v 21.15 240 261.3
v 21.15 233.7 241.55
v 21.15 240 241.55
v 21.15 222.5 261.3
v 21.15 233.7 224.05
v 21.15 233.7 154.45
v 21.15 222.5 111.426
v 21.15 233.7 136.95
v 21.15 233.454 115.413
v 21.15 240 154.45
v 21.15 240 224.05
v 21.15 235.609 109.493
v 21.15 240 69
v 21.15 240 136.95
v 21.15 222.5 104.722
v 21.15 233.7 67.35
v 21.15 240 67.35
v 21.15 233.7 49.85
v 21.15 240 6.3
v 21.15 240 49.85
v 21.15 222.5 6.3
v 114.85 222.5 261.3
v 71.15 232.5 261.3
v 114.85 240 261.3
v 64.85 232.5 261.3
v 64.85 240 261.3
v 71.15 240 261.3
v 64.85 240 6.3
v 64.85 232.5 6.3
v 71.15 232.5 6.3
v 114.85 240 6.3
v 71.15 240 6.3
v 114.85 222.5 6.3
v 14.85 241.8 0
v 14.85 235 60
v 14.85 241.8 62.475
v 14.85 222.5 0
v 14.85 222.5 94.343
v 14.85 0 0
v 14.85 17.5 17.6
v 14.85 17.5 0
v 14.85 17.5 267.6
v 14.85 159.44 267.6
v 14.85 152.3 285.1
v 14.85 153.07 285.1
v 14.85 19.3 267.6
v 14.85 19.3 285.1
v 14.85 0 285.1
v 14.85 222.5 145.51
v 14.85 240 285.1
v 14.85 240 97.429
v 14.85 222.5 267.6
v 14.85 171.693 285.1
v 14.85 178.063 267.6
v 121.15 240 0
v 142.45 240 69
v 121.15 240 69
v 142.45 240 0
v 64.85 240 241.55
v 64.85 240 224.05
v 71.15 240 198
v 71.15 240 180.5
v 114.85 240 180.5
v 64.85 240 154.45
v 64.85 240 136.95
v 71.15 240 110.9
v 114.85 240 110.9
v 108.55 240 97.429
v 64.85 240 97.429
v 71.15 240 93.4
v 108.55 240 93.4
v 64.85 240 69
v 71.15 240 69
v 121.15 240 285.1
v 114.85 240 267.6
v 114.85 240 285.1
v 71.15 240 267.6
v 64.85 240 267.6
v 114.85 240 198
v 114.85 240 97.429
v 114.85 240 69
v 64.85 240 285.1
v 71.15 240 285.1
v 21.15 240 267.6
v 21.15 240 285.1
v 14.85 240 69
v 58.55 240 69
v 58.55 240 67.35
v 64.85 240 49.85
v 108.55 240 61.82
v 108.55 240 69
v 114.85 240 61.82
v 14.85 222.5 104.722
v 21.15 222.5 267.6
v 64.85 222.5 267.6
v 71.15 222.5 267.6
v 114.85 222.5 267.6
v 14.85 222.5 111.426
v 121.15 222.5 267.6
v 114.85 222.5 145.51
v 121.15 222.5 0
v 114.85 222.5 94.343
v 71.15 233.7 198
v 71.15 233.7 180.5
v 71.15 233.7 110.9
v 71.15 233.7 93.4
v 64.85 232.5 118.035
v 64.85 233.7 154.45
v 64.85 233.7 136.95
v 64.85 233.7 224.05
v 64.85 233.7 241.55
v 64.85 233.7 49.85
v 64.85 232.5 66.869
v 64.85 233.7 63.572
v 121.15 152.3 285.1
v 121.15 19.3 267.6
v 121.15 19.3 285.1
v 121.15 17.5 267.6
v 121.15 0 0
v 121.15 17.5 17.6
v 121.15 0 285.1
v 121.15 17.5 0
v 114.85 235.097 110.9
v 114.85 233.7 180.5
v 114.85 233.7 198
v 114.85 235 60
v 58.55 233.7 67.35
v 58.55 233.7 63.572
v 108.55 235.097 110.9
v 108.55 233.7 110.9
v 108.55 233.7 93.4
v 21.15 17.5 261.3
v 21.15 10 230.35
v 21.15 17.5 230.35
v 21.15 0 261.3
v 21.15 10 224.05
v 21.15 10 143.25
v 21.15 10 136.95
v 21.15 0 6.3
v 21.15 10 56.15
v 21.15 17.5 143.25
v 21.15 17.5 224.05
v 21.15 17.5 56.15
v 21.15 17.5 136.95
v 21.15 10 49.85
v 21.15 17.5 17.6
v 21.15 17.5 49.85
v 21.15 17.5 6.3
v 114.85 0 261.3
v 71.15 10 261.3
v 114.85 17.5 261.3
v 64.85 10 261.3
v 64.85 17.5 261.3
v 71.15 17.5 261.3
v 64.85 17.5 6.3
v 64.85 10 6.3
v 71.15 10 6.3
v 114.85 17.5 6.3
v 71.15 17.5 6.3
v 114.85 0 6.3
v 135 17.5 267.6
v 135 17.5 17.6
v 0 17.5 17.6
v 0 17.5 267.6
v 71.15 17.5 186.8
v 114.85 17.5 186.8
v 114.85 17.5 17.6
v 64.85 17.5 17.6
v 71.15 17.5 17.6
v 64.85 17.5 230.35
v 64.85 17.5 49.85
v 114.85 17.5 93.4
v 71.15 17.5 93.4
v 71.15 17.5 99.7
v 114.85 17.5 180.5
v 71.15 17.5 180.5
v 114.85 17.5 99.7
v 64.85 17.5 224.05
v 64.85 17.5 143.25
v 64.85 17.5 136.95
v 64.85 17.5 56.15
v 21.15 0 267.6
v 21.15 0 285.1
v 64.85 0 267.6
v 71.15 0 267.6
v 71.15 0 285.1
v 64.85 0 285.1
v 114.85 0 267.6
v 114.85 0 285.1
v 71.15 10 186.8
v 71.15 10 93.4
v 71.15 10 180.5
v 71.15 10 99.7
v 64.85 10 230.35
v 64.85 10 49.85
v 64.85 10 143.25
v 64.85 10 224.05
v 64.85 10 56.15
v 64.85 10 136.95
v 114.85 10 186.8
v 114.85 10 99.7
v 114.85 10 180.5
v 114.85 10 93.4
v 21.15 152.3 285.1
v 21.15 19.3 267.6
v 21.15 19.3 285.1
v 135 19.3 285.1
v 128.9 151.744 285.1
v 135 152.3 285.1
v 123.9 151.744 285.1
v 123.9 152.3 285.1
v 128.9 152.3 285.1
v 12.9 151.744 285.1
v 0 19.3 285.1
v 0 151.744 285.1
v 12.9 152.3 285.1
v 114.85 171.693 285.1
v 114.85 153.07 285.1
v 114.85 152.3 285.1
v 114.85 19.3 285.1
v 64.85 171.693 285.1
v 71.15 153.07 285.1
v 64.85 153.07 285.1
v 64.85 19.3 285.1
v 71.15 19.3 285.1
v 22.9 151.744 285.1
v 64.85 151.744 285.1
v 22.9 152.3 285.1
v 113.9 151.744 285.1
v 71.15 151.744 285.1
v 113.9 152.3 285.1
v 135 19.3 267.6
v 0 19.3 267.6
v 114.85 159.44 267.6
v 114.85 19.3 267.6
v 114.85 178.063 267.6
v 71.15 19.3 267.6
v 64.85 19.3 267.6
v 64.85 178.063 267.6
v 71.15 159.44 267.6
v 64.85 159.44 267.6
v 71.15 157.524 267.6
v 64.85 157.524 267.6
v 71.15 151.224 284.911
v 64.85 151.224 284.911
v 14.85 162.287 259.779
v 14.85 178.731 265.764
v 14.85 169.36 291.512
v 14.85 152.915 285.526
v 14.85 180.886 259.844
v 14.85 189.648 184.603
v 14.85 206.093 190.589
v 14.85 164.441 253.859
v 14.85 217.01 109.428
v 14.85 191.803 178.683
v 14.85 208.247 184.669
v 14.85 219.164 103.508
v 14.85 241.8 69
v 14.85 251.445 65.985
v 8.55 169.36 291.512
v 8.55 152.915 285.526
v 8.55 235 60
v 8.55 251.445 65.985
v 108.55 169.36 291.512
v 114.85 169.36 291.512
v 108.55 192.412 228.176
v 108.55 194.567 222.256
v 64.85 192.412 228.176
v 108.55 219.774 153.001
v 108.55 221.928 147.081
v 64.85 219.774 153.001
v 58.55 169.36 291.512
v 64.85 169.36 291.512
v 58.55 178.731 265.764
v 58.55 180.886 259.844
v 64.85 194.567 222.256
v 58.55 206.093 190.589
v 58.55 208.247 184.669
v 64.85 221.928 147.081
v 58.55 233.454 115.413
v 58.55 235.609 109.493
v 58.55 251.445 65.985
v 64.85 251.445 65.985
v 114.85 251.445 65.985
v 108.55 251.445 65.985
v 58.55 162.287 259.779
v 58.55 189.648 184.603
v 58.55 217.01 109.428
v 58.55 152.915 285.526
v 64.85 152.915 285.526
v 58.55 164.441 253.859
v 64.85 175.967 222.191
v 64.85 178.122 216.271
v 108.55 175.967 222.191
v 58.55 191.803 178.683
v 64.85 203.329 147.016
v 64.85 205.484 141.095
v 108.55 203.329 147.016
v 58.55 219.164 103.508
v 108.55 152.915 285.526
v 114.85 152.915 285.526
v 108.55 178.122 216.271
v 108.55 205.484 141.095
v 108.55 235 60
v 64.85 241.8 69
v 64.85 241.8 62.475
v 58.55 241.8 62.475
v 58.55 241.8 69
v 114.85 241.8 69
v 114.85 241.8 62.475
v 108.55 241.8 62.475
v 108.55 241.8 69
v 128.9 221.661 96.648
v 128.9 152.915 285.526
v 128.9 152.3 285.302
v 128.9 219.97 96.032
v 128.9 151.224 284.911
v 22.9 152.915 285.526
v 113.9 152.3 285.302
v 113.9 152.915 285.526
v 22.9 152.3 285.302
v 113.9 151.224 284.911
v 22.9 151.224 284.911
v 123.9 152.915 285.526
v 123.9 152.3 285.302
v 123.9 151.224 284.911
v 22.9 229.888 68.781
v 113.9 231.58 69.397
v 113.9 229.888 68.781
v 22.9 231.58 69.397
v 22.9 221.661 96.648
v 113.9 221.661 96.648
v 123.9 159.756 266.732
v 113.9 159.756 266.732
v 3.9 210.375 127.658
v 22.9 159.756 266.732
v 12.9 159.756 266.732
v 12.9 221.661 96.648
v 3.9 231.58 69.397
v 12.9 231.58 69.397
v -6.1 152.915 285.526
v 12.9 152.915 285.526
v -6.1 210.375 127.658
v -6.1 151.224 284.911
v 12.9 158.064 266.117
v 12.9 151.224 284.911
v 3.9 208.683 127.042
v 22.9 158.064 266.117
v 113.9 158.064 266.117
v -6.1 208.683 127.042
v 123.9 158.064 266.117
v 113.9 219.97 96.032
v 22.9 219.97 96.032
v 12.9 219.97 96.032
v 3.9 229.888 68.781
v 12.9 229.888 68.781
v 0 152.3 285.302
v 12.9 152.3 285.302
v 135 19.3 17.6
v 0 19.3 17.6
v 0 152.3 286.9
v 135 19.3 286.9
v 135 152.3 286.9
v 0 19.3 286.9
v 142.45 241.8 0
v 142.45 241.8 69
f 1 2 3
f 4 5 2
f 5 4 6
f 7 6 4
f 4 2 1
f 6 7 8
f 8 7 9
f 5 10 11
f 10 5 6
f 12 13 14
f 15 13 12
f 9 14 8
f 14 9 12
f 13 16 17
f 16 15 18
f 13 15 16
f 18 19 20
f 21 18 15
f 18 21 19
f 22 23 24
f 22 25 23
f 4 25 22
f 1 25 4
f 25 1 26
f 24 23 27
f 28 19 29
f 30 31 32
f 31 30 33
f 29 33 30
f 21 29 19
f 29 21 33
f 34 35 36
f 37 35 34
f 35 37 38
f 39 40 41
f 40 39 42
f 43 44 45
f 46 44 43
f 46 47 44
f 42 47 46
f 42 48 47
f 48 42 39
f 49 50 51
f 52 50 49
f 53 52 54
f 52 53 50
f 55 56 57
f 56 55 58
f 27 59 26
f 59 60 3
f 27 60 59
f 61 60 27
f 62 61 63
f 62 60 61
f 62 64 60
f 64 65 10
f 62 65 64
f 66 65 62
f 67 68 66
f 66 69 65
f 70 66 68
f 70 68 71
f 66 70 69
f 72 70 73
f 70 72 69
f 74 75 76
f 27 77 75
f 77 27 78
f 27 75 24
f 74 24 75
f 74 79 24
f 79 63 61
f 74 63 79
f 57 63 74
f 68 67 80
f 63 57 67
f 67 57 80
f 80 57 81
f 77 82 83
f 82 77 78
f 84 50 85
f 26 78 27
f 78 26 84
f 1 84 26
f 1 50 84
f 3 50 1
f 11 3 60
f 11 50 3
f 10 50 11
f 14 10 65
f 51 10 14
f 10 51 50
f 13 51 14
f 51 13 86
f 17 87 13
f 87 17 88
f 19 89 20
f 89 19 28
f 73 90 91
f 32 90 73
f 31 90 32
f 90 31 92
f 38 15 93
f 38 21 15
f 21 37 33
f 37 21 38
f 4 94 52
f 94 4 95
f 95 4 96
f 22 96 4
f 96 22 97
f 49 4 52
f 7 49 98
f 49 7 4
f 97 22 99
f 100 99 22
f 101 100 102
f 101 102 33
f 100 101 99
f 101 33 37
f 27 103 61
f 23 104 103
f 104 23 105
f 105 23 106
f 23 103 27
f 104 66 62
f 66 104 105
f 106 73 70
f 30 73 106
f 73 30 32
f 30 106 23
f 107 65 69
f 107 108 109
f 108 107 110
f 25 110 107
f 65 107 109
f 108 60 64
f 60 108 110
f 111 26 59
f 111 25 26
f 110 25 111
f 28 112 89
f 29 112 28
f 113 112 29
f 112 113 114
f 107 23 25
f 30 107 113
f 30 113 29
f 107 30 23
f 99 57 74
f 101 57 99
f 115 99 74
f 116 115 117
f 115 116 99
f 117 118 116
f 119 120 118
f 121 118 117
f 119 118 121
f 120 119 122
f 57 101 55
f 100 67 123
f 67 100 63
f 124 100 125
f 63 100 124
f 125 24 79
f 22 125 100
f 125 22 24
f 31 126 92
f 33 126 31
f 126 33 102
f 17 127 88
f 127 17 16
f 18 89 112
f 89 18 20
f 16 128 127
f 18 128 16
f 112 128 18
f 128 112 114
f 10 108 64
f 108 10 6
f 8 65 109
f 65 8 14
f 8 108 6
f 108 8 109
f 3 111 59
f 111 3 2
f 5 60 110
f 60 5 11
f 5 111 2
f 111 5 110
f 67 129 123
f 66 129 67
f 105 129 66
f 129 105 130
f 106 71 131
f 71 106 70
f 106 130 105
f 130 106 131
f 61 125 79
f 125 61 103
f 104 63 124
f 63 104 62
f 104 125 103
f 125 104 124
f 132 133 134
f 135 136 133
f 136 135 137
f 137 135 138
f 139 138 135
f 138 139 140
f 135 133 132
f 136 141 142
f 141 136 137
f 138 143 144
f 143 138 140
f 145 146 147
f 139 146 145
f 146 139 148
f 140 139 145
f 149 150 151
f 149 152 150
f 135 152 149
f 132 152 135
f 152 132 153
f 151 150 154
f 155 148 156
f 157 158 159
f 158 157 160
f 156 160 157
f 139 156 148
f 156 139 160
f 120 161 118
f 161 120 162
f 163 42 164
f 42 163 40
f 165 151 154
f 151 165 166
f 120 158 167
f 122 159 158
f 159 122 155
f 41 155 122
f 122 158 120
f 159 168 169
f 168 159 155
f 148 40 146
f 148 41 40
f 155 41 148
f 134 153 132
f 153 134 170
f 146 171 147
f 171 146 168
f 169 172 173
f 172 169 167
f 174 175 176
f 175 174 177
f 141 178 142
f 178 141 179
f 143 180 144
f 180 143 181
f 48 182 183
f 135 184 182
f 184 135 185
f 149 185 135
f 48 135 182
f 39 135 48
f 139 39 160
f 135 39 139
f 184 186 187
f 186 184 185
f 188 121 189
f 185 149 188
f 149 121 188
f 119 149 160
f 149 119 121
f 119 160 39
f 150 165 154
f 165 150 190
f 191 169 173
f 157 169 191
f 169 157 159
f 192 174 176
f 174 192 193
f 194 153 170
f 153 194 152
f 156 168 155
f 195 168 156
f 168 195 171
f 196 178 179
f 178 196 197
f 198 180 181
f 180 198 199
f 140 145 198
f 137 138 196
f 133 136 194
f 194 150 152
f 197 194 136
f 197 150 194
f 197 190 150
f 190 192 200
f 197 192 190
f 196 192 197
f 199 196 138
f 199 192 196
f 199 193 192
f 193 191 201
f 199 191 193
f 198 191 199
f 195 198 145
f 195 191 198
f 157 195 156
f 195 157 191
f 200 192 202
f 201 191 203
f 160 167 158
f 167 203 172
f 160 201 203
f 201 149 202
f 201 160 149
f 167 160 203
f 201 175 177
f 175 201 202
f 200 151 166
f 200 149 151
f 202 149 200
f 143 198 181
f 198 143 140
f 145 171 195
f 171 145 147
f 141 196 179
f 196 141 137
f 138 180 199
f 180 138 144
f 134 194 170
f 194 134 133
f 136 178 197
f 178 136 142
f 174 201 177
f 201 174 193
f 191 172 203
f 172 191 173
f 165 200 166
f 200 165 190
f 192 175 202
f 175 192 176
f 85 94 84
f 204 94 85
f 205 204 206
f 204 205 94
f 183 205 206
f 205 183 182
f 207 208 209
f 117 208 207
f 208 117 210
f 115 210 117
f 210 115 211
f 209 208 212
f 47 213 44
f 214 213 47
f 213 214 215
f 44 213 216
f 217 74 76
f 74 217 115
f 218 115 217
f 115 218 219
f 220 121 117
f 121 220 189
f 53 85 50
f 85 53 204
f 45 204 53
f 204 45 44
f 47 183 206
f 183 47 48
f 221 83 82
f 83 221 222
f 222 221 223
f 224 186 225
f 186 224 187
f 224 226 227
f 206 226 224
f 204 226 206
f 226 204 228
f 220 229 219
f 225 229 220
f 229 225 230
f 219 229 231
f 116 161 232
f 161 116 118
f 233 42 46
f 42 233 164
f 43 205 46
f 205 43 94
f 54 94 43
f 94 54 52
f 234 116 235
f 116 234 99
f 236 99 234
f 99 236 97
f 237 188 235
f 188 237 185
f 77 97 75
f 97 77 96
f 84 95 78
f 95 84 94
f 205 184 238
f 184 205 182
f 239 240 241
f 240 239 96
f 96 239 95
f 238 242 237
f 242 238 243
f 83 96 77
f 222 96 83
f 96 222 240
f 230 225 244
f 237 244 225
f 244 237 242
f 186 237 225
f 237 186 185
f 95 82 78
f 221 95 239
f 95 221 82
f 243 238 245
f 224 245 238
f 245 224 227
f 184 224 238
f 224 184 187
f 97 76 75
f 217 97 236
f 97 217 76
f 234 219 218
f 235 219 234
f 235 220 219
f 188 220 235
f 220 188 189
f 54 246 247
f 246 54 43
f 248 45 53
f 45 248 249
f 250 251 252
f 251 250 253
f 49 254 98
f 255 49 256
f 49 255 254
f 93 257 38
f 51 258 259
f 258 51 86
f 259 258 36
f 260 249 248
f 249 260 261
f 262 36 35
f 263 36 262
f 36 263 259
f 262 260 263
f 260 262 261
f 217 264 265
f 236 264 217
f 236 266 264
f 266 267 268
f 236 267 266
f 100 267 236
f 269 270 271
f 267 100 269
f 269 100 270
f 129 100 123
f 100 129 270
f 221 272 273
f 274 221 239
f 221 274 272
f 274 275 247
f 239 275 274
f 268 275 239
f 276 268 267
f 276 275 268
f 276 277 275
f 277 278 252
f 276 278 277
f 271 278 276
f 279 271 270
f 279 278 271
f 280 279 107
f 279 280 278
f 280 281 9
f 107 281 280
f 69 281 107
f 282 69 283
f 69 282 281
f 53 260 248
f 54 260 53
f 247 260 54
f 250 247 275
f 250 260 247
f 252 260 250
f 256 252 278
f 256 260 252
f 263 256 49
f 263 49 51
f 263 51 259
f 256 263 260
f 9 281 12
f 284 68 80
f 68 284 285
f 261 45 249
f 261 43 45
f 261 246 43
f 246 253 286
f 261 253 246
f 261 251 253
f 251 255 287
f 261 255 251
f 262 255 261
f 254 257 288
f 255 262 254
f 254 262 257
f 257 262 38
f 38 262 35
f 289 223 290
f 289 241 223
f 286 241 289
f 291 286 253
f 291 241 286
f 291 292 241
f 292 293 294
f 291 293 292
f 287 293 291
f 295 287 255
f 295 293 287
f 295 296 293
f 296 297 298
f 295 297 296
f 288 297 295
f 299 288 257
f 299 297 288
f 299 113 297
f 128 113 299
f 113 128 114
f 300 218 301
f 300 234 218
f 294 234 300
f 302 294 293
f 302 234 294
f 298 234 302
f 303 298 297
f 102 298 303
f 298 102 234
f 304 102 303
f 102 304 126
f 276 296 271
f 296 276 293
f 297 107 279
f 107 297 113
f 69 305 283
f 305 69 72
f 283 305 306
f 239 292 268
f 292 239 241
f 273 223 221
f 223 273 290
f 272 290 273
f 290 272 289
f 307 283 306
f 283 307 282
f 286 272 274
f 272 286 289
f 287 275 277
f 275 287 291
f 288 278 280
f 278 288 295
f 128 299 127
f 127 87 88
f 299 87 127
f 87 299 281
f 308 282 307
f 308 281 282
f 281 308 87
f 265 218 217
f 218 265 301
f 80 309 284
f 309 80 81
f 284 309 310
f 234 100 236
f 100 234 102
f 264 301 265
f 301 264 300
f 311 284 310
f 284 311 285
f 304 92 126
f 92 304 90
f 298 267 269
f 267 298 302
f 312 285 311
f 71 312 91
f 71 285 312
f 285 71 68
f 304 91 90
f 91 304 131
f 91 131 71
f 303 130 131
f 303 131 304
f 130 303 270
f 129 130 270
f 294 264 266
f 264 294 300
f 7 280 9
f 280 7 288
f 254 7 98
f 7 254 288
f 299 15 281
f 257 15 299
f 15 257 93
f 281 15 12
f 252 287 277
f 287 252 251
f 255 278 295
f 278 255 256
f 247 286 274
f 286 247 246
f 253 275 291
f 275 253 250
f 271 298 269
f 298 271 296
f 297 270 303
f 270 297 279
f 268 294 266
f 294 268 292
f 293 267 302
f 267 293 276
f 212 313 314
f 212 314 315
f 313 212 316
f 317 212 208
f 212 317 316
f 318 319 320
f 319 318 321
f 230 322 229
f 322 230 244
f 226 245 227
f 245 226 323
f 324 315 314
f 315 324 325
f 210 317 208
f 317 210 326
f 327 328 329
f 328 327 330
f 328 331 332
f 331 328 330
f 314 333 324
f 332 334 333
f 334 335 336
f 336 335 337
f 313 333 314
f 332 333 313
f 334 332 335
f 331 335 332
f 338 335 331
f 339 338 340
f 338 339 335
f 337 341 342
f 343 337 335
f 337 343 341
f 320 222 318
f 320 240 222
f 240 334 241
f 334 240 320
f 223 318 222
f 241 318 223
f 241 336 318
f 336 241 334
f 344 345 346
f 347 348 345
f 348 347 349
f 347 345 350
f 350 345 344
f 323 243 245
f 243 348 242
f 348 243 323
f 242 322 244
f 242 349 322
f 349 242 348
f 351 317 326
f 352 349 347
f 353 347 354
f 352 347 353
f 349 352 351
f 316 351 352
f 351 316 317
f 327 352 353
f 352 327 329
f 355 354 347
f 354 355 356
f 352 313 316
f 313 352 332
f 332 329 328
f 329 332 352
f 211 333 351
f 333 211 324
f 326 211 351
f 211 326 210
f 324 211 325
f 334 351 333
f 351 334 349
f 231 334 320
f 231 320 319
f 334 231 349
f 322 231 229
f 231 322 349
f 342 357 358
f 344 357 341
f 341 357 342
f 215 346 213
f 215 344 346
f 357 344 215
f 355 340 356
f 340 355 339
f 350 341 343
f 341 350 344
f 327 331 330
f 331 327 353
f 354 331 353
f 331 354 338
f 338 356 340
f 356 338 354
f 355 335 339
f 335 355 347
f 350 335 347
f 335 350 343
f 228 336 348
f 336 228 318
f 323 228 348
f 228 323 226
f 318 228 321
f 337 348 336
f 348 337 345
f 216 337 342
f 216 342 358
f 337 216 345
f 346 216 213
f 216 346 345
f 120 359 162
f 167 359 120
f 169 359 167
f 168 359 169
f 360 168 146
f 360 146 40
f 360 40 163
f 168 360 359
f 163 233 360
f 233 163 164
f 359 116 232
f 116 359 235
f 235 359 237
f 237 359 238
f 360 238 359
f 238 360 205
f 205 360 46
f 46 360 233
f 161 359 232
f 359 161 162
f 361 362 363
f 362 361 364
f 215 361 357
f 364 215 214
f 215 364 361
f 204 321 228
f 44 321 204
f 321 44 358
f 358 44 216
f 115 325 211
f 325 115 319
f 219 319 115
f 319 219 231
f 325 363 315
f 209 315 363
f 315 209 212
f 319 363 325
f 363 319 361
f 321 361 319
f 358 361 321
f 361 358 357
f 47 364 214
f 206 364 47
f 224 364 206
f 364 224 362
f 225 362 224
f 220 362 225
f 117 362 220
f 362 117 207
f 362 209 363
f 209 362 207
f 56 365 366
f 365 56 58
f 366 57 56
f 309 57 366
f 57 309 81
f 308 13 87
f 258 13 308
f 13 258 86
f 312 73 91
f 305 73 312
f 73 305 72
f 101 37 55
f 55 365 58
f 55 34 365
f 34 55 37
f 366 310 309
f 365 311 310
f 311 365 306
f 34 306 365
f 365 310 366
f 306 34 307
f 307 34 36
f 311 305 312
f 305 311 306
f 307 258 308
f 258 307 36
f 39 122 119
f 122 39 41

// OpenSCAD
// file: GuestRoomForClimbing.scad
/*
  File:
  GuestRoomForClimbing.scad

  Description:
  The guest room in 45 rue VIlleroy place for climbing

  Auteur : Paul-Elliot Anglèes d'Auriac

  Licence : CC-BY-SA 3.0
*/

module guestRoomForClimbing() {
union() {
    translate([0,260,0]) cube([136,4,300]);

    translate([-4,260-49,0]) cube([4,49,300]);

    translate([136,260-59,0]) cube([4,59,300]);

    translate([136,260-59,0]) cube([23,4,300]);

    difference() {
        translate([136+23,260-59-126,0]) cube([4,126,300]);
        translate([136+23-1, 75+14, 100]) cube([6,(126-3*14)/2,160]);
        translate([136+23-1, 75+14+(126-3*14)/2+14, 100]) cube([6,(126-3*14)/2,160]);
    }

    translate([136,260-59-126-4,0]) cube([23,4,300]);

    translate([136,260-59-126-75,0]) cube([4,75,300]);

    translate([0,-4,0]) cube([136,4,300]);
    
    translate([0,260-20,180]) cube([136,20,120]);

    translate([-60,35,0]) cube([195,120,50]);
*    translate([10,25,0]) cube([120,195,50]);
}

}
// main file
/*
  File:
  ClimbingStructure.scad

  Description:
  The structure for climbing

  Auteur : Paul-Elliot Anglèes d'Auriac

  Licence : CC-BY-SA 3.0
*/


$largeur = 6.3;
$longueur = 17.5;
$largeur_fine = 6.3;
$longueur_fine = 7.5;
$rallonge = 15;

$epaisseur_panneau = 1.8;
$longueur_panneau = 115+$largeur*2;
$largeur_panneau = 100;

$largeur_barre_basse = 100;

$nb_tasseaux = 2;


$show_panneau = true;

use <GuestRoomForClimbing.scad>

% guestRoomForClimbing();


/**************************************************/
// la structure, côté voisin
/**************************************************/

for(i = [0:$nb_tasseaux]) {
  if(i%2==0) {
    translate([(136-$largeur_barre_basse-$largeur)/2+i*($largeur_barre_basse/$nb_tasseaux), 260-20-$longueur,$largeur]) cube([$largeur, $longueur, 240+$rallonge]);  // barre verticale
    echo(str("poutre de dimension", [$longueur, $largeur, 240+$rallonge]));
  }
  else {
    translate([(136-$largeur_barre_basse-$largeur)/2+i*($largeur_barre_basse/$nb_tasseaux), 260-20-$longueur_fine,$largeur]) cube([$largeur_fine, $longueur_fine, 240+$rallonge]);  // barre verticale
    echo(str("poutre de dimension", [$longueur_fine, $largeur_fine, 240+$rallonge]));
    }
 }
translate([(136-$largeur_barre_basse-$largeur)/2,260-20-$longueur,0]) cube([$largeur_barre_basse+$largeur, $longueur, $largeur]);  // barre horizontale basse
echo(str("poutre de dimension", [$longueur, $largeur, $largeur_barre_basse+$largeur]));
translate([(136-$largeur_barre_basse-$largeur)/2,260-20-$longueur,240+$rallonge+$largeur]) cube([$largeur_barre_basse+$largeur, $longueur, $largeur]);  // barre horizontale haute
echo(str("poutre de dimension", [$longueur, $largeur, $largeur_barre_basse+$largeur]));

// Tasseaux
for(i = [0:$nb_tasseaux-1]) {
  if(i%2!=0) { // 2 tasseaux par interval
    translate([$largeur+(136-$largeur_barre_basse-$largeur)/2+i*($largeur_barre_basse/$nb_tasseaux), 260-20-$largeur,(240+$rallonge+$largeur)/6*2+$largeur])  cube([($largeur_barre_basse/$nb_tasseaux)-$largeur,$largeur,$longueur]);
    echo(str("poutre de dimension", [$longueur, $largeur, ($largeur_barre_basse/$nb_tasseaux)-$largeur]));
    translate([$largeur+(136-$largeur_barre_basse-$largeur)/2+i*($largeur_barre_basse/$nb_tasseaux), 260-20-$largeur,(240+$rallonge+$largeur)/6*4+$largeur])  cube([($largeur_barre_basse/$nb_tasseaux)-$largeur,$largeur,$longueur]);
    echo(str("poutre de dimension", [$longueur, $largeur, ($largeur_barre_basse/$nb_tasseaux)-$largeur]));
  }
  else { // 3 tasseaux par interval
    translate([$largeur+(136-$largeur_barre_basse-$largeur)/2+i*($largeur_barre_basse/$nb_tasseaux), 260-20-$largeur,(240+$rallonge+$largeur)/6*1+$largeur])  cube([($largeur_barre_basse/$nb_tasseaux)-$largeur,$largeur,$longueur]);
    echo(str("poutre de dimension", [$longueur, $largeur, ($largeur_barre_basse/$nb_tasseaux)-$largeur]));
    translate([$largeur+(136-$largeur_barre_basse-$largeur)/2+i*($largeur_barre_basse/$nb_tasseaux), 260-20-$largeur,(240+$rallonge+$largeur)/6*3+$largeur])  cube([($largeur_barre_basse/$nb_tasseaux)-$largeur,$largeur,$longueur]);
    echo(str("poutre de dimension", [$longueur, $largeur, ($largeur_barre_basse/$nb_tasseaux)-$largeur]));
    translate([$largeur+(136-$largeur_barre_basse-$largeur)/2+i*($largeur_barre_basse/$nb_tasseaux), 260-20-$largeur,(240+$rallonge+$largeur)/6*5+$largeur])  cube([($largeur_barre_basse/$nb_tasseaux)-$largeur,$largeur,$longueur]);
    echo(str("poutre de dimension", [$longueur, $largeur, ($largeur_barre_basse/$nb_tasseaux)-$largeur]));
  }
 }

/**************************************************/
// la structure côté salon
/**************************************************/

for(i = [0:$nb_tasseaux]) {
  if(i%2==0) {
    translate([(136-$largeur_barre_basse-$largeur)/2+i*($largeur_barre_basse/$nb_tasseaux), 0,$largeur]) cube([$largeur, $longueur, 240+$rallonge]);  // barre verticale
    echo(str("poutre de dimension", [$longueur, $largeur, 240+$rallonge]));
  }
  else {
    translate([(136-$largeur_barre_basse-$largeur)/2+i*($largeur_barre_basse/$nb_tasseaux), $longueur-$longueur_fine,$largeur]) cube([$largeur_fine, $longueur_fine, 240+$rallonge]);  // barre verticale
    echo(str("poutre de dimension", [$longueur, $largeur, 240+$rallonge]));      
  }
 }

translate([(136-$largeur_barre_basse-$largeur)/2,0,0]) cube([$largeur_barre_basse+$largeur, $longueur, $largeur]);  // barre horizontale basse
echo(str("poutre de dimension", [$longueur, $largeur, $largeur_barre_basse+$largeur]));
translate([(136-$largeur_barre_basse-$largeur)/2,0,240+$largeur+$rallonge]) cube([$largeur_barre_basse+$largeur, $longueur, $largeur]);  // barre horizontale haute
echo(str("poutre de dimension", [$longueur, $largeur, $largeur_barre_basse+$largeur]));

// Tasseaux
for(i = [0:$nb_tasseaux-1]) {
  if(i%2!=0) { // 2 tasseaux par interval
    translate([$largeur+(136-$largeur_barre_basse-$largeur)/2+i*($largeur_barre_basse/$nb_tasseaux), $longueur-$longueur_fine,(240+$rallonge+$largeur)/6*2+$largeur])  cube([($largeur_barre_basse/$nb_tasseaux)-$largeur,$longueur_fine,$largeur_fine]);
    echo(str("poutre de dimension", [$longueur_fine, $largeur_fine, $largeur_barre_basse+$largeur]));
    translate([$largeur+(136-$largeur_barre_basse-$largeur)/2+i*($largeur_barre_basse/$nb_tasseaux), $longueur-$longueur_fine,(240+$rallonge+$largeur)/6*4+$largeur])  cube([($largeur_barre_basse/$nb_tasseaux)-$largeur,$longueur_fine,$largeur_fine]);
    echo(str("poutre de dimension", [$longueur_fine, $largeur_fine, $largeur_barre_basse+$largeur]));
  }
  else { // 3 tasseaux par interval
    translate([$largeur+(136-$largeur_barre_basse-$largeur)/2+i*($largeur_barre_basse/$nb_tasseaux), $longueur-$longueur_fine,(240+$rallonge+$largeur)/6*1+$largeur])  cube([($largeur_barre_basse/$nb_tasseaux)-$largeur,$longueur_fine,$largeur_fine]);
    echo(str("poutre de dimension", [$longueur_fine, $largeur_fine, $largeur_barre_basse+$largeur]));
    translate([$largeur+(136-$largeur_barre_basse-$largeur)/2+i*($largeur_barre_basse/$nb_tasseaux), $longueur-$longueur_fine,(240+$rallonge+$largeur)/6*3+$largeur])  cube([($largeur_barre_basse/$nb_tasseaux)-$largeur,$longueur_fine,$largeur_fine]);
    echo(str("poutre de dimension", [$longueur_fine, $largeur_fine, $largeur_barre_basse+$largeur]));
    translate([$largeur+(136-$largeur_barre_basse-$largeur)/2+i*($largeur_barre_basse/$nb_tasseaux), $longueur-$longueur_fine,(240+$rallonge+$largeur)/6*5+$largeur])  cube([($largeur_barre_basse/$nb_tasseaux)-$largeur,$longueur_fine,$largeur_fine]);
    echo(str("poutre de dimension", [$longueur_fine, $largeur_fine, $largeur_barre_basse+$largeur]));
  }
 }


/**************************************************/
// la structure plafond
/**************************************************/
/*
// barre de soutien plate
translate([(136-$largeur_barre_basse-$largeur)/2,260-20-$longueur,240+$rallonge+$largeur]) cube([$largeur_barre_basse+$largeur, $longueur, $largeur]); // côté voisin
echo(str("poutre de dimension", [$longueur, $largeur, $largeur_barre_basse+$largeur]));
translate([(136-$largeur_barre_basse-$largeur)/2,0,240+$rallonge+$largeur]) cube([$largeur_barre_basse+$largeur, $longueur, $largeur]); // côté salon
echo(str("poutre de dimension", [$longueur, $largeur, $largeur_barre_basse+$largeur]));

// barres verticales pour ajouter $rallonge cm de hauteur
for(i = [0:$nb_tasseau]) {
  translate([(136-$largeur_barre_basse-$largeur)/2+i*($largeur_barre_basse/$nb_tasseaux), 0,240+$largeur+$largeur]) cube([$largeur, $longueur, $rallonge-$largeur]); // côté salon
  echo(str("poutre de dimension", [$longueur, $largeur, $rallonge-$largeur]));
 }
for(i = [0:$nb_tasseau]) {
  translate([(136-$largeur_barre_basse-$largeur)/2+i*($largeur_barre_basse/$nb_tasseaux), 260-20-$longueur,240+$largeur+$largeur]) cube([$largeur, $longueur, $rallonge-$largeur]);  // côté voisin
  echo(str("poutre de dimension", [$longueur, $largeur, $rallonge-$largeur]));
 }
*/
// poutres traversantes
for(i = [0:$nb_tasseaux]) {
  translate([(136-$largeur_barre_basse-$largeur)/2+i*($largeur_barre_basse/$nb_tasseaux), 0, 240+$largeur+$largeur+$rallonge]) cube([$largeur,240,$longueur]);  // barre longue
  echo(str("poutre de dimension", [$longueur, $largeur, 240]));
 }

// Tasseaux
/* for(i = [0:$nb_tasseaux-1]) { */
/*   if(i%2!=0) { // 2 tasseaux par interval */
/*     translate([$largeur+(136-$largeur_barre_basse-$largeur)/2+i*($largeur_barre_basse/$nb_tasseaux), 240/6*2+$largeur,240+$largeur+$largeur+$rallonge])  cube([($largeur_barre_basse/$nb_tasseaux)-$largeur,$largeur, $longueur]); */
/*     echo(str("poutre de dimension", [$longueur, $largeur, ($largeur_barre_basse/$nb_tasseaux)-$largeur])); */
/*     translate([$largeur+(136-$largeur_barre_basse-$largeur)/2+i*($largeur_barre_basse/$nb_tasseaux), 240/6*4+$largeur,240+$largeur+$largeur+$rallonge])  cube([($largeur_barre_basse/$nb_tasseaux)-$largeur,$largeur, $longueur]); */
/*     echo(str("poutre de dimension", [$longueur, $largeur, ($largeur_barre_basse/$nb_tasseaux)-$largeur])); */
/*   } */
/*   else { // 3 tasseaux par interval */
/*     translate([$largeur+(136-$largeur_barre_basse-$largeur)/2+i*($largeur_barre_basse/$nb_tasseaux),240/6*1+$largeur,240+$largeur+$largeur+$rallonge])  cube([($largeur_barre_basse/$nb_tasseaux)-$largeur,$largeur, $longueur]); */
/*     echo(str("poutre de dimension", [$longueur, $largeur, ($largeur_barre_basse/$nb_tasseaux)-$largeur])); */
/*     translate([$largeur+(136-$largeur_barre_basse-$largeur)/2+i*($largeur_barre_basse/$nb_tasseaux),240/6*3+$largeur,240+$largeur+$largeur+$rallonge])  cube([($largeur_barre_basse/$nb_tasseaux)-$largeur,$largeur, $longueur]); */
/*     echo(str("poutre de dimension", [$longueur, $largeur, ($largeur_barre_basse/$nb_tasseaux)-$largeur])); */
/*     translate([$largeur+(136-$largeur_barre_basse-$largeur)/2+i*($largeur_barre_basse/$nb_tasseaux),240/6*5+$largeur,240+$largeur+$largeur+$rallonge])  cube([($largeur_barre_basse/$nb_tasseaux)-$largeur,$largeur, $longueur]); */
/*     echo(str("poutre de dimension", [$longueur, $largeur, ($largeur_barre_basse/$nb_tasseaux)-$largeur])); */
/*   } */
/*  } */

/**************************************************/
// Le plan incliné
/**************************************************/

translate([-$largeur*2,235,60]) {
  rotate(a=[20,0,0])  {
    // translate([0,0,0]){
    for(i = [0:$nb_tasseaux]) {
      translate([$largeur+(136-$largeur_barre_basse-$largeur)/2+i*($largeur_barre_basse/$nb_tasseaux),0,0]) cube([$largeur, $longueur, 240]);
      echo(str("poutre de dimension", [$longueur, $largeur, 240]));
    }
    for(i = [0:$nb_tasseaux-1]) {
      if(i%2!=0) { // 2 tasseaux par interval
	translate([$largeur+$largeur+(136-$largeur_barre_basse-$largeur)/2+i*($largeur_barre_basse/$nb_tasseaux), 0, 240/6*2+$largeur])  cube([($largeur_barre_basse/$nb_tasseaux)-$largeur,$longueur, $largeur]);
	echo(str("poutre de dimension", [$longueur, $largeur, ($largeur_barre_basse/$nb_tasseaux)-$largeur]));
	translate([$largeur+$largeur+(136-$largeur_barre_basse-$largeur)/2+i*($largeur_barre_basse/$nb_tasseaux), 0, 240/6*4+$largeur])  cube([($largeur_barre_basse/$nb_tasseaux)-$largeur,$longueur, $largeur]);
	echo(str("poutre de dimension", [$longueur, $largeur, ($largeur_barre_basse/$nb_tasseaux)-$largeur]));
      }
      else { // 3 tasseaux par interval
	translate([$largeur+$largeur+(136-$largeur_barre_basse-$largeur)/2+i*($largeur_barre_basse/$nb_tasseaux), 0, 240/6*1+$largeur])  cube([($largeur_barre_basse/$nb_tasseaux)-$largeur,$longueur, $largeur]);
	echo(str("poutre de dimension", [$longueur, $largeur, ($largeur_barre_basse/$nb_tasseaux)-$largeur]));
	translate([$largeur+$largeur+(136-$largeur_barre_basse-$largeur)/2+i*($largeur_barre_basse/$nb_tasseaux), 0, 240/6*3+$largeur])  cube([($largeur_barre_basse/$nb_tasseaux)-$largeur,$longueur, $largeur]);
	echo(str("poutre de dimension", [$longueur, $largeur, ($largeur_barre_basse/$nb_tasseaux)-$largeur]));
	translate([$largeur+$largeur+(136-$largeur_barre_basse-$largeur)/2+i*($largeur_barre_basse/$nb_tasseaux), 0, 240/6*5+$largeur])  cube([($largeur_barre_basse/$nb_tasseaux)-$largeur,$longueur, $largeur]);
	echo(str("poutre de dimension", [$longueur, $largeur, ($largeur_barre_basse/$nb_tasseaux)-$largeur]));
      }
    }
    // panneaux du plan incliné
    if($show_panneau) {
      translate([74,-$epaisseur_panneau,10]){
	difference () 
	  {
	cube([67.5,$epaisseur_panneau, 230]);
	translate([67.5-15,-1,-1]) cube([20,3,30]);
	translate([67.5-15,-1,210]) cube([10,3,30]);
	  }
	
      } 
      translate([74-67.5,-$epaisseur_panneau,10]){
	difference () 
	  {
	cube([67.5,$epaisseur_panneau, 230]);
	translate([19,-2,-1]) cube([10,5,30]);
	translate([-1,-2,-1]) cube([11,5,63]);
	translate([19,-2,210]) cube([10,5,30]);
	  }
	
      } 
      echo(str("panneau OBS de dimension", [$longueur_panneau, $largeur_panneau, $epaisseur_panneau]));
      echo(str("panneau OBS de dimension", [$longueur_panneau, $largeur_panneau, $epaisseur_panneau]));
      /* translate([(136-$largeur_barre_basse-$largeur)/2+$largeur,-$epaisseur_panneau,$largeur_panneau+10]) cube([$longueur_panneau,$epaisseur_panneau,$largeur_panneau]); */
      /* echo(str("panneau OBS de dimension", [$longueur_panneau, $largeur_panneau, $epaisseur_panneau])); */
      /* translate([(136-$largeur_barre_basse-$largeur)/2+$largeur,-$epaisseur_panneau,2*$largeur_panneau+10]) cube([$longueur_panneau,$epaisseur_panneau,22]); */
      /* echo(str("panneau OBS de dimension", [$longueur_panneau, 22, $epaisseur_panneau])); */
    }
  }
}

/**************************************************/
// les panneaux
/**************************************************/
if($show_panneau){
  // Panneaux côté salon
  translate([0,$longueur,240+$rallonge+2*$largeur-250]) cube([67.5,1.8,250]);
  echo(str("panneau OBS de dimension", [[67.5,1.8,250]]));
  translate([67.5,$longueur,240+$rallonge+2*$largeur-250]) cube([67.5,1.8,250]);
  echo(str("panneau OBS de dimension", [[67.5,1.8,250]]));
  /* translate([(136-$largeur_barre_basse-$largeur)/2,$longueur,0]) cube([$longueur_panneau,$epaisseur_panneau,$largeur_panneau]); */
  /* echo(str("panneau OBS de dimension", [$longueur_panneau, $largeur_panneau, $epaisseur_panneau])); */
  /* translate([(136-$largeur_barre_basse-$largeur)/2,$longueur,$largeur_panneau]) cube([$longueur_panneau,$epaisseur_panneau,$largeur_panneau]); */
  /* echo(str("panneau OBS de dimension", [$longueur_panneau, $largeur_panneau, $epaisseur_panneau])); */
  /* translate([(136-$largeur_barre_basse-$largeur)/2,$longueur,2*$largeur_panneau]) cube([$longueur_panneau,$epaisseur_panneau,240+$rallonge+2*$largeur-2*$largeur_panneau]); */
  /* echo(str("panneau OBS de dimension", [$longueur_panneau, 240+$rallonge+2*$largeur-2*$largeur_panneau, $epaisseur_panneau])); */

  // Panneaux côté plafond
  translate([0,$longueur+$epaisseur_panneau,240+$rallonge+2*$largeur+$longueur]) cube([67.5,133, $epaisseur_panneau]);
  echo(str("panneau OBS de dimension", [$longueur_panneau, $largeur_panneau, $epaisseur_panneau]));
  translate([67.5,$longueur+$epaisseur_panneau,240+$rallonge+2*$largeur+$longueur]) cube([67.5,133, $epaisseur_panneau]);
  echo(str("panneau OBS de dimension", [$longueur_panneau, $largeur_panneau, $epaisseur_panneau]));
  /* translate([(136-$largeur_barre_basse-$largeur)/2,$longueur+$epaisseur_panneau+$largeur_panneau,240+$rallonge+2*$largeur+$longueur]) cube([$longueur_panneau,45,$epaisseur_panneau]); */
  /* echo(str("panneau OBS de dimension", [$longueur_panneau, 45, $epaisseur_panneau])); */

  // Panneaux côté voisins
  translate([(136-$largeur_barre_basse-$largeur)/2,240/* -$longueur-$epaisseur_panneau */,0]) cube([$longueur_panneau,$epaisseur_panneau,69]);
  echo(str("panneau OBS de dimension", [$longueur_panneau, 69, $epaisseur_panneau]));
 }
